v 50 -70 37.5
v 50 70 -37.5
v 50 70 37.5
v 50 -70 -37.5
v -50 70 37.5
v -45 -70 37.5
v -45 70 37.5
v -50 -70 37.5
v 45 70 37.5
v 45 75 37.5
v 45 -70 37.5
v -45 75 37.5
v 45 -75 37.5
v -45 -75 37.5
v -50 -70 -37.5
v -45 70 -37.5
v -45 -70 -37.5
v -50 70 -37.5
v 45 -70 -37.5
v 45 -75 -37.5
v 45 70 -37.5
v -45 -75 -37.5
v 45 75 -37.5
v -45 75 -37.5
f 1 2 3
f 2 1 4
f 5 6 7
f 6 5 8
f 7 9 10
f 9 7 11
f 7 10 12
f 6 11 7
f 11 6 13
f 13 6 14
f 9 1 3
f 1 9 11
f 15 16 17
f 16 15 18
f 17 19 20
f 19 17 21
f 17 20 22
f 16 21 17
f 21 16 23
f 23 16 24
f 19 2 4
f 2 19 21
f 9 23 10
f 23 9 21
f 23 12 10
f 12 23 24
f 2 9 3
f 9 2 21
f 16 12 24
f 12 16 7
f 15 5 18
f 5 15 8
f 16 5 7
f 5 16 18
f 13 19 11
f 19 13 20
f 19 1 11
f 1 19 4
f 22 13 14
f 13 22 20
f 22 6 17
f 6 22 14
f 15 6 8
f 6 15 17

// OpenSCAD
// Table Parameters
tableWidth = 100;         // Width of the table
tableLength = 150;        // Length of the table
tableHeight = 75;         // Height of the table
legThickness = 5;         // Thickness of the table legs

// Generate Table
module table() {
    difference() {
        cube([tableWidth, tableLength, tableHeight], center=true);  // Table surface
        union() {
            translate([(tableWidth/2 - legThickness/2), (tableLength/2 - legThickness/2), 0])
            cube([legThickness, legThickness, tableHeight], center=true);  // Front left leg
            translate([-(tableWidth/2 - legThickness/2), (tableLength/2 - legThickness/2), 0])
            cube([legThickness, legThickness, tableHeight], center=true);  // Front right leg
            translate([(tableWidth/2 - legThickness/2), -(tableLength/2 - legThickness/2), 0])
            cube([legThickness, legThickness, tableHeight], center=true);  // Back left leg
            translate([-(tableWidth/2 - legThickness/2), -(tableLength/2 - legThickness/2), 0])
            cube([legThickness, legThickness, tableHeight], center=true);  // Back right leg
        }
    }
}

// Render Table
table();
